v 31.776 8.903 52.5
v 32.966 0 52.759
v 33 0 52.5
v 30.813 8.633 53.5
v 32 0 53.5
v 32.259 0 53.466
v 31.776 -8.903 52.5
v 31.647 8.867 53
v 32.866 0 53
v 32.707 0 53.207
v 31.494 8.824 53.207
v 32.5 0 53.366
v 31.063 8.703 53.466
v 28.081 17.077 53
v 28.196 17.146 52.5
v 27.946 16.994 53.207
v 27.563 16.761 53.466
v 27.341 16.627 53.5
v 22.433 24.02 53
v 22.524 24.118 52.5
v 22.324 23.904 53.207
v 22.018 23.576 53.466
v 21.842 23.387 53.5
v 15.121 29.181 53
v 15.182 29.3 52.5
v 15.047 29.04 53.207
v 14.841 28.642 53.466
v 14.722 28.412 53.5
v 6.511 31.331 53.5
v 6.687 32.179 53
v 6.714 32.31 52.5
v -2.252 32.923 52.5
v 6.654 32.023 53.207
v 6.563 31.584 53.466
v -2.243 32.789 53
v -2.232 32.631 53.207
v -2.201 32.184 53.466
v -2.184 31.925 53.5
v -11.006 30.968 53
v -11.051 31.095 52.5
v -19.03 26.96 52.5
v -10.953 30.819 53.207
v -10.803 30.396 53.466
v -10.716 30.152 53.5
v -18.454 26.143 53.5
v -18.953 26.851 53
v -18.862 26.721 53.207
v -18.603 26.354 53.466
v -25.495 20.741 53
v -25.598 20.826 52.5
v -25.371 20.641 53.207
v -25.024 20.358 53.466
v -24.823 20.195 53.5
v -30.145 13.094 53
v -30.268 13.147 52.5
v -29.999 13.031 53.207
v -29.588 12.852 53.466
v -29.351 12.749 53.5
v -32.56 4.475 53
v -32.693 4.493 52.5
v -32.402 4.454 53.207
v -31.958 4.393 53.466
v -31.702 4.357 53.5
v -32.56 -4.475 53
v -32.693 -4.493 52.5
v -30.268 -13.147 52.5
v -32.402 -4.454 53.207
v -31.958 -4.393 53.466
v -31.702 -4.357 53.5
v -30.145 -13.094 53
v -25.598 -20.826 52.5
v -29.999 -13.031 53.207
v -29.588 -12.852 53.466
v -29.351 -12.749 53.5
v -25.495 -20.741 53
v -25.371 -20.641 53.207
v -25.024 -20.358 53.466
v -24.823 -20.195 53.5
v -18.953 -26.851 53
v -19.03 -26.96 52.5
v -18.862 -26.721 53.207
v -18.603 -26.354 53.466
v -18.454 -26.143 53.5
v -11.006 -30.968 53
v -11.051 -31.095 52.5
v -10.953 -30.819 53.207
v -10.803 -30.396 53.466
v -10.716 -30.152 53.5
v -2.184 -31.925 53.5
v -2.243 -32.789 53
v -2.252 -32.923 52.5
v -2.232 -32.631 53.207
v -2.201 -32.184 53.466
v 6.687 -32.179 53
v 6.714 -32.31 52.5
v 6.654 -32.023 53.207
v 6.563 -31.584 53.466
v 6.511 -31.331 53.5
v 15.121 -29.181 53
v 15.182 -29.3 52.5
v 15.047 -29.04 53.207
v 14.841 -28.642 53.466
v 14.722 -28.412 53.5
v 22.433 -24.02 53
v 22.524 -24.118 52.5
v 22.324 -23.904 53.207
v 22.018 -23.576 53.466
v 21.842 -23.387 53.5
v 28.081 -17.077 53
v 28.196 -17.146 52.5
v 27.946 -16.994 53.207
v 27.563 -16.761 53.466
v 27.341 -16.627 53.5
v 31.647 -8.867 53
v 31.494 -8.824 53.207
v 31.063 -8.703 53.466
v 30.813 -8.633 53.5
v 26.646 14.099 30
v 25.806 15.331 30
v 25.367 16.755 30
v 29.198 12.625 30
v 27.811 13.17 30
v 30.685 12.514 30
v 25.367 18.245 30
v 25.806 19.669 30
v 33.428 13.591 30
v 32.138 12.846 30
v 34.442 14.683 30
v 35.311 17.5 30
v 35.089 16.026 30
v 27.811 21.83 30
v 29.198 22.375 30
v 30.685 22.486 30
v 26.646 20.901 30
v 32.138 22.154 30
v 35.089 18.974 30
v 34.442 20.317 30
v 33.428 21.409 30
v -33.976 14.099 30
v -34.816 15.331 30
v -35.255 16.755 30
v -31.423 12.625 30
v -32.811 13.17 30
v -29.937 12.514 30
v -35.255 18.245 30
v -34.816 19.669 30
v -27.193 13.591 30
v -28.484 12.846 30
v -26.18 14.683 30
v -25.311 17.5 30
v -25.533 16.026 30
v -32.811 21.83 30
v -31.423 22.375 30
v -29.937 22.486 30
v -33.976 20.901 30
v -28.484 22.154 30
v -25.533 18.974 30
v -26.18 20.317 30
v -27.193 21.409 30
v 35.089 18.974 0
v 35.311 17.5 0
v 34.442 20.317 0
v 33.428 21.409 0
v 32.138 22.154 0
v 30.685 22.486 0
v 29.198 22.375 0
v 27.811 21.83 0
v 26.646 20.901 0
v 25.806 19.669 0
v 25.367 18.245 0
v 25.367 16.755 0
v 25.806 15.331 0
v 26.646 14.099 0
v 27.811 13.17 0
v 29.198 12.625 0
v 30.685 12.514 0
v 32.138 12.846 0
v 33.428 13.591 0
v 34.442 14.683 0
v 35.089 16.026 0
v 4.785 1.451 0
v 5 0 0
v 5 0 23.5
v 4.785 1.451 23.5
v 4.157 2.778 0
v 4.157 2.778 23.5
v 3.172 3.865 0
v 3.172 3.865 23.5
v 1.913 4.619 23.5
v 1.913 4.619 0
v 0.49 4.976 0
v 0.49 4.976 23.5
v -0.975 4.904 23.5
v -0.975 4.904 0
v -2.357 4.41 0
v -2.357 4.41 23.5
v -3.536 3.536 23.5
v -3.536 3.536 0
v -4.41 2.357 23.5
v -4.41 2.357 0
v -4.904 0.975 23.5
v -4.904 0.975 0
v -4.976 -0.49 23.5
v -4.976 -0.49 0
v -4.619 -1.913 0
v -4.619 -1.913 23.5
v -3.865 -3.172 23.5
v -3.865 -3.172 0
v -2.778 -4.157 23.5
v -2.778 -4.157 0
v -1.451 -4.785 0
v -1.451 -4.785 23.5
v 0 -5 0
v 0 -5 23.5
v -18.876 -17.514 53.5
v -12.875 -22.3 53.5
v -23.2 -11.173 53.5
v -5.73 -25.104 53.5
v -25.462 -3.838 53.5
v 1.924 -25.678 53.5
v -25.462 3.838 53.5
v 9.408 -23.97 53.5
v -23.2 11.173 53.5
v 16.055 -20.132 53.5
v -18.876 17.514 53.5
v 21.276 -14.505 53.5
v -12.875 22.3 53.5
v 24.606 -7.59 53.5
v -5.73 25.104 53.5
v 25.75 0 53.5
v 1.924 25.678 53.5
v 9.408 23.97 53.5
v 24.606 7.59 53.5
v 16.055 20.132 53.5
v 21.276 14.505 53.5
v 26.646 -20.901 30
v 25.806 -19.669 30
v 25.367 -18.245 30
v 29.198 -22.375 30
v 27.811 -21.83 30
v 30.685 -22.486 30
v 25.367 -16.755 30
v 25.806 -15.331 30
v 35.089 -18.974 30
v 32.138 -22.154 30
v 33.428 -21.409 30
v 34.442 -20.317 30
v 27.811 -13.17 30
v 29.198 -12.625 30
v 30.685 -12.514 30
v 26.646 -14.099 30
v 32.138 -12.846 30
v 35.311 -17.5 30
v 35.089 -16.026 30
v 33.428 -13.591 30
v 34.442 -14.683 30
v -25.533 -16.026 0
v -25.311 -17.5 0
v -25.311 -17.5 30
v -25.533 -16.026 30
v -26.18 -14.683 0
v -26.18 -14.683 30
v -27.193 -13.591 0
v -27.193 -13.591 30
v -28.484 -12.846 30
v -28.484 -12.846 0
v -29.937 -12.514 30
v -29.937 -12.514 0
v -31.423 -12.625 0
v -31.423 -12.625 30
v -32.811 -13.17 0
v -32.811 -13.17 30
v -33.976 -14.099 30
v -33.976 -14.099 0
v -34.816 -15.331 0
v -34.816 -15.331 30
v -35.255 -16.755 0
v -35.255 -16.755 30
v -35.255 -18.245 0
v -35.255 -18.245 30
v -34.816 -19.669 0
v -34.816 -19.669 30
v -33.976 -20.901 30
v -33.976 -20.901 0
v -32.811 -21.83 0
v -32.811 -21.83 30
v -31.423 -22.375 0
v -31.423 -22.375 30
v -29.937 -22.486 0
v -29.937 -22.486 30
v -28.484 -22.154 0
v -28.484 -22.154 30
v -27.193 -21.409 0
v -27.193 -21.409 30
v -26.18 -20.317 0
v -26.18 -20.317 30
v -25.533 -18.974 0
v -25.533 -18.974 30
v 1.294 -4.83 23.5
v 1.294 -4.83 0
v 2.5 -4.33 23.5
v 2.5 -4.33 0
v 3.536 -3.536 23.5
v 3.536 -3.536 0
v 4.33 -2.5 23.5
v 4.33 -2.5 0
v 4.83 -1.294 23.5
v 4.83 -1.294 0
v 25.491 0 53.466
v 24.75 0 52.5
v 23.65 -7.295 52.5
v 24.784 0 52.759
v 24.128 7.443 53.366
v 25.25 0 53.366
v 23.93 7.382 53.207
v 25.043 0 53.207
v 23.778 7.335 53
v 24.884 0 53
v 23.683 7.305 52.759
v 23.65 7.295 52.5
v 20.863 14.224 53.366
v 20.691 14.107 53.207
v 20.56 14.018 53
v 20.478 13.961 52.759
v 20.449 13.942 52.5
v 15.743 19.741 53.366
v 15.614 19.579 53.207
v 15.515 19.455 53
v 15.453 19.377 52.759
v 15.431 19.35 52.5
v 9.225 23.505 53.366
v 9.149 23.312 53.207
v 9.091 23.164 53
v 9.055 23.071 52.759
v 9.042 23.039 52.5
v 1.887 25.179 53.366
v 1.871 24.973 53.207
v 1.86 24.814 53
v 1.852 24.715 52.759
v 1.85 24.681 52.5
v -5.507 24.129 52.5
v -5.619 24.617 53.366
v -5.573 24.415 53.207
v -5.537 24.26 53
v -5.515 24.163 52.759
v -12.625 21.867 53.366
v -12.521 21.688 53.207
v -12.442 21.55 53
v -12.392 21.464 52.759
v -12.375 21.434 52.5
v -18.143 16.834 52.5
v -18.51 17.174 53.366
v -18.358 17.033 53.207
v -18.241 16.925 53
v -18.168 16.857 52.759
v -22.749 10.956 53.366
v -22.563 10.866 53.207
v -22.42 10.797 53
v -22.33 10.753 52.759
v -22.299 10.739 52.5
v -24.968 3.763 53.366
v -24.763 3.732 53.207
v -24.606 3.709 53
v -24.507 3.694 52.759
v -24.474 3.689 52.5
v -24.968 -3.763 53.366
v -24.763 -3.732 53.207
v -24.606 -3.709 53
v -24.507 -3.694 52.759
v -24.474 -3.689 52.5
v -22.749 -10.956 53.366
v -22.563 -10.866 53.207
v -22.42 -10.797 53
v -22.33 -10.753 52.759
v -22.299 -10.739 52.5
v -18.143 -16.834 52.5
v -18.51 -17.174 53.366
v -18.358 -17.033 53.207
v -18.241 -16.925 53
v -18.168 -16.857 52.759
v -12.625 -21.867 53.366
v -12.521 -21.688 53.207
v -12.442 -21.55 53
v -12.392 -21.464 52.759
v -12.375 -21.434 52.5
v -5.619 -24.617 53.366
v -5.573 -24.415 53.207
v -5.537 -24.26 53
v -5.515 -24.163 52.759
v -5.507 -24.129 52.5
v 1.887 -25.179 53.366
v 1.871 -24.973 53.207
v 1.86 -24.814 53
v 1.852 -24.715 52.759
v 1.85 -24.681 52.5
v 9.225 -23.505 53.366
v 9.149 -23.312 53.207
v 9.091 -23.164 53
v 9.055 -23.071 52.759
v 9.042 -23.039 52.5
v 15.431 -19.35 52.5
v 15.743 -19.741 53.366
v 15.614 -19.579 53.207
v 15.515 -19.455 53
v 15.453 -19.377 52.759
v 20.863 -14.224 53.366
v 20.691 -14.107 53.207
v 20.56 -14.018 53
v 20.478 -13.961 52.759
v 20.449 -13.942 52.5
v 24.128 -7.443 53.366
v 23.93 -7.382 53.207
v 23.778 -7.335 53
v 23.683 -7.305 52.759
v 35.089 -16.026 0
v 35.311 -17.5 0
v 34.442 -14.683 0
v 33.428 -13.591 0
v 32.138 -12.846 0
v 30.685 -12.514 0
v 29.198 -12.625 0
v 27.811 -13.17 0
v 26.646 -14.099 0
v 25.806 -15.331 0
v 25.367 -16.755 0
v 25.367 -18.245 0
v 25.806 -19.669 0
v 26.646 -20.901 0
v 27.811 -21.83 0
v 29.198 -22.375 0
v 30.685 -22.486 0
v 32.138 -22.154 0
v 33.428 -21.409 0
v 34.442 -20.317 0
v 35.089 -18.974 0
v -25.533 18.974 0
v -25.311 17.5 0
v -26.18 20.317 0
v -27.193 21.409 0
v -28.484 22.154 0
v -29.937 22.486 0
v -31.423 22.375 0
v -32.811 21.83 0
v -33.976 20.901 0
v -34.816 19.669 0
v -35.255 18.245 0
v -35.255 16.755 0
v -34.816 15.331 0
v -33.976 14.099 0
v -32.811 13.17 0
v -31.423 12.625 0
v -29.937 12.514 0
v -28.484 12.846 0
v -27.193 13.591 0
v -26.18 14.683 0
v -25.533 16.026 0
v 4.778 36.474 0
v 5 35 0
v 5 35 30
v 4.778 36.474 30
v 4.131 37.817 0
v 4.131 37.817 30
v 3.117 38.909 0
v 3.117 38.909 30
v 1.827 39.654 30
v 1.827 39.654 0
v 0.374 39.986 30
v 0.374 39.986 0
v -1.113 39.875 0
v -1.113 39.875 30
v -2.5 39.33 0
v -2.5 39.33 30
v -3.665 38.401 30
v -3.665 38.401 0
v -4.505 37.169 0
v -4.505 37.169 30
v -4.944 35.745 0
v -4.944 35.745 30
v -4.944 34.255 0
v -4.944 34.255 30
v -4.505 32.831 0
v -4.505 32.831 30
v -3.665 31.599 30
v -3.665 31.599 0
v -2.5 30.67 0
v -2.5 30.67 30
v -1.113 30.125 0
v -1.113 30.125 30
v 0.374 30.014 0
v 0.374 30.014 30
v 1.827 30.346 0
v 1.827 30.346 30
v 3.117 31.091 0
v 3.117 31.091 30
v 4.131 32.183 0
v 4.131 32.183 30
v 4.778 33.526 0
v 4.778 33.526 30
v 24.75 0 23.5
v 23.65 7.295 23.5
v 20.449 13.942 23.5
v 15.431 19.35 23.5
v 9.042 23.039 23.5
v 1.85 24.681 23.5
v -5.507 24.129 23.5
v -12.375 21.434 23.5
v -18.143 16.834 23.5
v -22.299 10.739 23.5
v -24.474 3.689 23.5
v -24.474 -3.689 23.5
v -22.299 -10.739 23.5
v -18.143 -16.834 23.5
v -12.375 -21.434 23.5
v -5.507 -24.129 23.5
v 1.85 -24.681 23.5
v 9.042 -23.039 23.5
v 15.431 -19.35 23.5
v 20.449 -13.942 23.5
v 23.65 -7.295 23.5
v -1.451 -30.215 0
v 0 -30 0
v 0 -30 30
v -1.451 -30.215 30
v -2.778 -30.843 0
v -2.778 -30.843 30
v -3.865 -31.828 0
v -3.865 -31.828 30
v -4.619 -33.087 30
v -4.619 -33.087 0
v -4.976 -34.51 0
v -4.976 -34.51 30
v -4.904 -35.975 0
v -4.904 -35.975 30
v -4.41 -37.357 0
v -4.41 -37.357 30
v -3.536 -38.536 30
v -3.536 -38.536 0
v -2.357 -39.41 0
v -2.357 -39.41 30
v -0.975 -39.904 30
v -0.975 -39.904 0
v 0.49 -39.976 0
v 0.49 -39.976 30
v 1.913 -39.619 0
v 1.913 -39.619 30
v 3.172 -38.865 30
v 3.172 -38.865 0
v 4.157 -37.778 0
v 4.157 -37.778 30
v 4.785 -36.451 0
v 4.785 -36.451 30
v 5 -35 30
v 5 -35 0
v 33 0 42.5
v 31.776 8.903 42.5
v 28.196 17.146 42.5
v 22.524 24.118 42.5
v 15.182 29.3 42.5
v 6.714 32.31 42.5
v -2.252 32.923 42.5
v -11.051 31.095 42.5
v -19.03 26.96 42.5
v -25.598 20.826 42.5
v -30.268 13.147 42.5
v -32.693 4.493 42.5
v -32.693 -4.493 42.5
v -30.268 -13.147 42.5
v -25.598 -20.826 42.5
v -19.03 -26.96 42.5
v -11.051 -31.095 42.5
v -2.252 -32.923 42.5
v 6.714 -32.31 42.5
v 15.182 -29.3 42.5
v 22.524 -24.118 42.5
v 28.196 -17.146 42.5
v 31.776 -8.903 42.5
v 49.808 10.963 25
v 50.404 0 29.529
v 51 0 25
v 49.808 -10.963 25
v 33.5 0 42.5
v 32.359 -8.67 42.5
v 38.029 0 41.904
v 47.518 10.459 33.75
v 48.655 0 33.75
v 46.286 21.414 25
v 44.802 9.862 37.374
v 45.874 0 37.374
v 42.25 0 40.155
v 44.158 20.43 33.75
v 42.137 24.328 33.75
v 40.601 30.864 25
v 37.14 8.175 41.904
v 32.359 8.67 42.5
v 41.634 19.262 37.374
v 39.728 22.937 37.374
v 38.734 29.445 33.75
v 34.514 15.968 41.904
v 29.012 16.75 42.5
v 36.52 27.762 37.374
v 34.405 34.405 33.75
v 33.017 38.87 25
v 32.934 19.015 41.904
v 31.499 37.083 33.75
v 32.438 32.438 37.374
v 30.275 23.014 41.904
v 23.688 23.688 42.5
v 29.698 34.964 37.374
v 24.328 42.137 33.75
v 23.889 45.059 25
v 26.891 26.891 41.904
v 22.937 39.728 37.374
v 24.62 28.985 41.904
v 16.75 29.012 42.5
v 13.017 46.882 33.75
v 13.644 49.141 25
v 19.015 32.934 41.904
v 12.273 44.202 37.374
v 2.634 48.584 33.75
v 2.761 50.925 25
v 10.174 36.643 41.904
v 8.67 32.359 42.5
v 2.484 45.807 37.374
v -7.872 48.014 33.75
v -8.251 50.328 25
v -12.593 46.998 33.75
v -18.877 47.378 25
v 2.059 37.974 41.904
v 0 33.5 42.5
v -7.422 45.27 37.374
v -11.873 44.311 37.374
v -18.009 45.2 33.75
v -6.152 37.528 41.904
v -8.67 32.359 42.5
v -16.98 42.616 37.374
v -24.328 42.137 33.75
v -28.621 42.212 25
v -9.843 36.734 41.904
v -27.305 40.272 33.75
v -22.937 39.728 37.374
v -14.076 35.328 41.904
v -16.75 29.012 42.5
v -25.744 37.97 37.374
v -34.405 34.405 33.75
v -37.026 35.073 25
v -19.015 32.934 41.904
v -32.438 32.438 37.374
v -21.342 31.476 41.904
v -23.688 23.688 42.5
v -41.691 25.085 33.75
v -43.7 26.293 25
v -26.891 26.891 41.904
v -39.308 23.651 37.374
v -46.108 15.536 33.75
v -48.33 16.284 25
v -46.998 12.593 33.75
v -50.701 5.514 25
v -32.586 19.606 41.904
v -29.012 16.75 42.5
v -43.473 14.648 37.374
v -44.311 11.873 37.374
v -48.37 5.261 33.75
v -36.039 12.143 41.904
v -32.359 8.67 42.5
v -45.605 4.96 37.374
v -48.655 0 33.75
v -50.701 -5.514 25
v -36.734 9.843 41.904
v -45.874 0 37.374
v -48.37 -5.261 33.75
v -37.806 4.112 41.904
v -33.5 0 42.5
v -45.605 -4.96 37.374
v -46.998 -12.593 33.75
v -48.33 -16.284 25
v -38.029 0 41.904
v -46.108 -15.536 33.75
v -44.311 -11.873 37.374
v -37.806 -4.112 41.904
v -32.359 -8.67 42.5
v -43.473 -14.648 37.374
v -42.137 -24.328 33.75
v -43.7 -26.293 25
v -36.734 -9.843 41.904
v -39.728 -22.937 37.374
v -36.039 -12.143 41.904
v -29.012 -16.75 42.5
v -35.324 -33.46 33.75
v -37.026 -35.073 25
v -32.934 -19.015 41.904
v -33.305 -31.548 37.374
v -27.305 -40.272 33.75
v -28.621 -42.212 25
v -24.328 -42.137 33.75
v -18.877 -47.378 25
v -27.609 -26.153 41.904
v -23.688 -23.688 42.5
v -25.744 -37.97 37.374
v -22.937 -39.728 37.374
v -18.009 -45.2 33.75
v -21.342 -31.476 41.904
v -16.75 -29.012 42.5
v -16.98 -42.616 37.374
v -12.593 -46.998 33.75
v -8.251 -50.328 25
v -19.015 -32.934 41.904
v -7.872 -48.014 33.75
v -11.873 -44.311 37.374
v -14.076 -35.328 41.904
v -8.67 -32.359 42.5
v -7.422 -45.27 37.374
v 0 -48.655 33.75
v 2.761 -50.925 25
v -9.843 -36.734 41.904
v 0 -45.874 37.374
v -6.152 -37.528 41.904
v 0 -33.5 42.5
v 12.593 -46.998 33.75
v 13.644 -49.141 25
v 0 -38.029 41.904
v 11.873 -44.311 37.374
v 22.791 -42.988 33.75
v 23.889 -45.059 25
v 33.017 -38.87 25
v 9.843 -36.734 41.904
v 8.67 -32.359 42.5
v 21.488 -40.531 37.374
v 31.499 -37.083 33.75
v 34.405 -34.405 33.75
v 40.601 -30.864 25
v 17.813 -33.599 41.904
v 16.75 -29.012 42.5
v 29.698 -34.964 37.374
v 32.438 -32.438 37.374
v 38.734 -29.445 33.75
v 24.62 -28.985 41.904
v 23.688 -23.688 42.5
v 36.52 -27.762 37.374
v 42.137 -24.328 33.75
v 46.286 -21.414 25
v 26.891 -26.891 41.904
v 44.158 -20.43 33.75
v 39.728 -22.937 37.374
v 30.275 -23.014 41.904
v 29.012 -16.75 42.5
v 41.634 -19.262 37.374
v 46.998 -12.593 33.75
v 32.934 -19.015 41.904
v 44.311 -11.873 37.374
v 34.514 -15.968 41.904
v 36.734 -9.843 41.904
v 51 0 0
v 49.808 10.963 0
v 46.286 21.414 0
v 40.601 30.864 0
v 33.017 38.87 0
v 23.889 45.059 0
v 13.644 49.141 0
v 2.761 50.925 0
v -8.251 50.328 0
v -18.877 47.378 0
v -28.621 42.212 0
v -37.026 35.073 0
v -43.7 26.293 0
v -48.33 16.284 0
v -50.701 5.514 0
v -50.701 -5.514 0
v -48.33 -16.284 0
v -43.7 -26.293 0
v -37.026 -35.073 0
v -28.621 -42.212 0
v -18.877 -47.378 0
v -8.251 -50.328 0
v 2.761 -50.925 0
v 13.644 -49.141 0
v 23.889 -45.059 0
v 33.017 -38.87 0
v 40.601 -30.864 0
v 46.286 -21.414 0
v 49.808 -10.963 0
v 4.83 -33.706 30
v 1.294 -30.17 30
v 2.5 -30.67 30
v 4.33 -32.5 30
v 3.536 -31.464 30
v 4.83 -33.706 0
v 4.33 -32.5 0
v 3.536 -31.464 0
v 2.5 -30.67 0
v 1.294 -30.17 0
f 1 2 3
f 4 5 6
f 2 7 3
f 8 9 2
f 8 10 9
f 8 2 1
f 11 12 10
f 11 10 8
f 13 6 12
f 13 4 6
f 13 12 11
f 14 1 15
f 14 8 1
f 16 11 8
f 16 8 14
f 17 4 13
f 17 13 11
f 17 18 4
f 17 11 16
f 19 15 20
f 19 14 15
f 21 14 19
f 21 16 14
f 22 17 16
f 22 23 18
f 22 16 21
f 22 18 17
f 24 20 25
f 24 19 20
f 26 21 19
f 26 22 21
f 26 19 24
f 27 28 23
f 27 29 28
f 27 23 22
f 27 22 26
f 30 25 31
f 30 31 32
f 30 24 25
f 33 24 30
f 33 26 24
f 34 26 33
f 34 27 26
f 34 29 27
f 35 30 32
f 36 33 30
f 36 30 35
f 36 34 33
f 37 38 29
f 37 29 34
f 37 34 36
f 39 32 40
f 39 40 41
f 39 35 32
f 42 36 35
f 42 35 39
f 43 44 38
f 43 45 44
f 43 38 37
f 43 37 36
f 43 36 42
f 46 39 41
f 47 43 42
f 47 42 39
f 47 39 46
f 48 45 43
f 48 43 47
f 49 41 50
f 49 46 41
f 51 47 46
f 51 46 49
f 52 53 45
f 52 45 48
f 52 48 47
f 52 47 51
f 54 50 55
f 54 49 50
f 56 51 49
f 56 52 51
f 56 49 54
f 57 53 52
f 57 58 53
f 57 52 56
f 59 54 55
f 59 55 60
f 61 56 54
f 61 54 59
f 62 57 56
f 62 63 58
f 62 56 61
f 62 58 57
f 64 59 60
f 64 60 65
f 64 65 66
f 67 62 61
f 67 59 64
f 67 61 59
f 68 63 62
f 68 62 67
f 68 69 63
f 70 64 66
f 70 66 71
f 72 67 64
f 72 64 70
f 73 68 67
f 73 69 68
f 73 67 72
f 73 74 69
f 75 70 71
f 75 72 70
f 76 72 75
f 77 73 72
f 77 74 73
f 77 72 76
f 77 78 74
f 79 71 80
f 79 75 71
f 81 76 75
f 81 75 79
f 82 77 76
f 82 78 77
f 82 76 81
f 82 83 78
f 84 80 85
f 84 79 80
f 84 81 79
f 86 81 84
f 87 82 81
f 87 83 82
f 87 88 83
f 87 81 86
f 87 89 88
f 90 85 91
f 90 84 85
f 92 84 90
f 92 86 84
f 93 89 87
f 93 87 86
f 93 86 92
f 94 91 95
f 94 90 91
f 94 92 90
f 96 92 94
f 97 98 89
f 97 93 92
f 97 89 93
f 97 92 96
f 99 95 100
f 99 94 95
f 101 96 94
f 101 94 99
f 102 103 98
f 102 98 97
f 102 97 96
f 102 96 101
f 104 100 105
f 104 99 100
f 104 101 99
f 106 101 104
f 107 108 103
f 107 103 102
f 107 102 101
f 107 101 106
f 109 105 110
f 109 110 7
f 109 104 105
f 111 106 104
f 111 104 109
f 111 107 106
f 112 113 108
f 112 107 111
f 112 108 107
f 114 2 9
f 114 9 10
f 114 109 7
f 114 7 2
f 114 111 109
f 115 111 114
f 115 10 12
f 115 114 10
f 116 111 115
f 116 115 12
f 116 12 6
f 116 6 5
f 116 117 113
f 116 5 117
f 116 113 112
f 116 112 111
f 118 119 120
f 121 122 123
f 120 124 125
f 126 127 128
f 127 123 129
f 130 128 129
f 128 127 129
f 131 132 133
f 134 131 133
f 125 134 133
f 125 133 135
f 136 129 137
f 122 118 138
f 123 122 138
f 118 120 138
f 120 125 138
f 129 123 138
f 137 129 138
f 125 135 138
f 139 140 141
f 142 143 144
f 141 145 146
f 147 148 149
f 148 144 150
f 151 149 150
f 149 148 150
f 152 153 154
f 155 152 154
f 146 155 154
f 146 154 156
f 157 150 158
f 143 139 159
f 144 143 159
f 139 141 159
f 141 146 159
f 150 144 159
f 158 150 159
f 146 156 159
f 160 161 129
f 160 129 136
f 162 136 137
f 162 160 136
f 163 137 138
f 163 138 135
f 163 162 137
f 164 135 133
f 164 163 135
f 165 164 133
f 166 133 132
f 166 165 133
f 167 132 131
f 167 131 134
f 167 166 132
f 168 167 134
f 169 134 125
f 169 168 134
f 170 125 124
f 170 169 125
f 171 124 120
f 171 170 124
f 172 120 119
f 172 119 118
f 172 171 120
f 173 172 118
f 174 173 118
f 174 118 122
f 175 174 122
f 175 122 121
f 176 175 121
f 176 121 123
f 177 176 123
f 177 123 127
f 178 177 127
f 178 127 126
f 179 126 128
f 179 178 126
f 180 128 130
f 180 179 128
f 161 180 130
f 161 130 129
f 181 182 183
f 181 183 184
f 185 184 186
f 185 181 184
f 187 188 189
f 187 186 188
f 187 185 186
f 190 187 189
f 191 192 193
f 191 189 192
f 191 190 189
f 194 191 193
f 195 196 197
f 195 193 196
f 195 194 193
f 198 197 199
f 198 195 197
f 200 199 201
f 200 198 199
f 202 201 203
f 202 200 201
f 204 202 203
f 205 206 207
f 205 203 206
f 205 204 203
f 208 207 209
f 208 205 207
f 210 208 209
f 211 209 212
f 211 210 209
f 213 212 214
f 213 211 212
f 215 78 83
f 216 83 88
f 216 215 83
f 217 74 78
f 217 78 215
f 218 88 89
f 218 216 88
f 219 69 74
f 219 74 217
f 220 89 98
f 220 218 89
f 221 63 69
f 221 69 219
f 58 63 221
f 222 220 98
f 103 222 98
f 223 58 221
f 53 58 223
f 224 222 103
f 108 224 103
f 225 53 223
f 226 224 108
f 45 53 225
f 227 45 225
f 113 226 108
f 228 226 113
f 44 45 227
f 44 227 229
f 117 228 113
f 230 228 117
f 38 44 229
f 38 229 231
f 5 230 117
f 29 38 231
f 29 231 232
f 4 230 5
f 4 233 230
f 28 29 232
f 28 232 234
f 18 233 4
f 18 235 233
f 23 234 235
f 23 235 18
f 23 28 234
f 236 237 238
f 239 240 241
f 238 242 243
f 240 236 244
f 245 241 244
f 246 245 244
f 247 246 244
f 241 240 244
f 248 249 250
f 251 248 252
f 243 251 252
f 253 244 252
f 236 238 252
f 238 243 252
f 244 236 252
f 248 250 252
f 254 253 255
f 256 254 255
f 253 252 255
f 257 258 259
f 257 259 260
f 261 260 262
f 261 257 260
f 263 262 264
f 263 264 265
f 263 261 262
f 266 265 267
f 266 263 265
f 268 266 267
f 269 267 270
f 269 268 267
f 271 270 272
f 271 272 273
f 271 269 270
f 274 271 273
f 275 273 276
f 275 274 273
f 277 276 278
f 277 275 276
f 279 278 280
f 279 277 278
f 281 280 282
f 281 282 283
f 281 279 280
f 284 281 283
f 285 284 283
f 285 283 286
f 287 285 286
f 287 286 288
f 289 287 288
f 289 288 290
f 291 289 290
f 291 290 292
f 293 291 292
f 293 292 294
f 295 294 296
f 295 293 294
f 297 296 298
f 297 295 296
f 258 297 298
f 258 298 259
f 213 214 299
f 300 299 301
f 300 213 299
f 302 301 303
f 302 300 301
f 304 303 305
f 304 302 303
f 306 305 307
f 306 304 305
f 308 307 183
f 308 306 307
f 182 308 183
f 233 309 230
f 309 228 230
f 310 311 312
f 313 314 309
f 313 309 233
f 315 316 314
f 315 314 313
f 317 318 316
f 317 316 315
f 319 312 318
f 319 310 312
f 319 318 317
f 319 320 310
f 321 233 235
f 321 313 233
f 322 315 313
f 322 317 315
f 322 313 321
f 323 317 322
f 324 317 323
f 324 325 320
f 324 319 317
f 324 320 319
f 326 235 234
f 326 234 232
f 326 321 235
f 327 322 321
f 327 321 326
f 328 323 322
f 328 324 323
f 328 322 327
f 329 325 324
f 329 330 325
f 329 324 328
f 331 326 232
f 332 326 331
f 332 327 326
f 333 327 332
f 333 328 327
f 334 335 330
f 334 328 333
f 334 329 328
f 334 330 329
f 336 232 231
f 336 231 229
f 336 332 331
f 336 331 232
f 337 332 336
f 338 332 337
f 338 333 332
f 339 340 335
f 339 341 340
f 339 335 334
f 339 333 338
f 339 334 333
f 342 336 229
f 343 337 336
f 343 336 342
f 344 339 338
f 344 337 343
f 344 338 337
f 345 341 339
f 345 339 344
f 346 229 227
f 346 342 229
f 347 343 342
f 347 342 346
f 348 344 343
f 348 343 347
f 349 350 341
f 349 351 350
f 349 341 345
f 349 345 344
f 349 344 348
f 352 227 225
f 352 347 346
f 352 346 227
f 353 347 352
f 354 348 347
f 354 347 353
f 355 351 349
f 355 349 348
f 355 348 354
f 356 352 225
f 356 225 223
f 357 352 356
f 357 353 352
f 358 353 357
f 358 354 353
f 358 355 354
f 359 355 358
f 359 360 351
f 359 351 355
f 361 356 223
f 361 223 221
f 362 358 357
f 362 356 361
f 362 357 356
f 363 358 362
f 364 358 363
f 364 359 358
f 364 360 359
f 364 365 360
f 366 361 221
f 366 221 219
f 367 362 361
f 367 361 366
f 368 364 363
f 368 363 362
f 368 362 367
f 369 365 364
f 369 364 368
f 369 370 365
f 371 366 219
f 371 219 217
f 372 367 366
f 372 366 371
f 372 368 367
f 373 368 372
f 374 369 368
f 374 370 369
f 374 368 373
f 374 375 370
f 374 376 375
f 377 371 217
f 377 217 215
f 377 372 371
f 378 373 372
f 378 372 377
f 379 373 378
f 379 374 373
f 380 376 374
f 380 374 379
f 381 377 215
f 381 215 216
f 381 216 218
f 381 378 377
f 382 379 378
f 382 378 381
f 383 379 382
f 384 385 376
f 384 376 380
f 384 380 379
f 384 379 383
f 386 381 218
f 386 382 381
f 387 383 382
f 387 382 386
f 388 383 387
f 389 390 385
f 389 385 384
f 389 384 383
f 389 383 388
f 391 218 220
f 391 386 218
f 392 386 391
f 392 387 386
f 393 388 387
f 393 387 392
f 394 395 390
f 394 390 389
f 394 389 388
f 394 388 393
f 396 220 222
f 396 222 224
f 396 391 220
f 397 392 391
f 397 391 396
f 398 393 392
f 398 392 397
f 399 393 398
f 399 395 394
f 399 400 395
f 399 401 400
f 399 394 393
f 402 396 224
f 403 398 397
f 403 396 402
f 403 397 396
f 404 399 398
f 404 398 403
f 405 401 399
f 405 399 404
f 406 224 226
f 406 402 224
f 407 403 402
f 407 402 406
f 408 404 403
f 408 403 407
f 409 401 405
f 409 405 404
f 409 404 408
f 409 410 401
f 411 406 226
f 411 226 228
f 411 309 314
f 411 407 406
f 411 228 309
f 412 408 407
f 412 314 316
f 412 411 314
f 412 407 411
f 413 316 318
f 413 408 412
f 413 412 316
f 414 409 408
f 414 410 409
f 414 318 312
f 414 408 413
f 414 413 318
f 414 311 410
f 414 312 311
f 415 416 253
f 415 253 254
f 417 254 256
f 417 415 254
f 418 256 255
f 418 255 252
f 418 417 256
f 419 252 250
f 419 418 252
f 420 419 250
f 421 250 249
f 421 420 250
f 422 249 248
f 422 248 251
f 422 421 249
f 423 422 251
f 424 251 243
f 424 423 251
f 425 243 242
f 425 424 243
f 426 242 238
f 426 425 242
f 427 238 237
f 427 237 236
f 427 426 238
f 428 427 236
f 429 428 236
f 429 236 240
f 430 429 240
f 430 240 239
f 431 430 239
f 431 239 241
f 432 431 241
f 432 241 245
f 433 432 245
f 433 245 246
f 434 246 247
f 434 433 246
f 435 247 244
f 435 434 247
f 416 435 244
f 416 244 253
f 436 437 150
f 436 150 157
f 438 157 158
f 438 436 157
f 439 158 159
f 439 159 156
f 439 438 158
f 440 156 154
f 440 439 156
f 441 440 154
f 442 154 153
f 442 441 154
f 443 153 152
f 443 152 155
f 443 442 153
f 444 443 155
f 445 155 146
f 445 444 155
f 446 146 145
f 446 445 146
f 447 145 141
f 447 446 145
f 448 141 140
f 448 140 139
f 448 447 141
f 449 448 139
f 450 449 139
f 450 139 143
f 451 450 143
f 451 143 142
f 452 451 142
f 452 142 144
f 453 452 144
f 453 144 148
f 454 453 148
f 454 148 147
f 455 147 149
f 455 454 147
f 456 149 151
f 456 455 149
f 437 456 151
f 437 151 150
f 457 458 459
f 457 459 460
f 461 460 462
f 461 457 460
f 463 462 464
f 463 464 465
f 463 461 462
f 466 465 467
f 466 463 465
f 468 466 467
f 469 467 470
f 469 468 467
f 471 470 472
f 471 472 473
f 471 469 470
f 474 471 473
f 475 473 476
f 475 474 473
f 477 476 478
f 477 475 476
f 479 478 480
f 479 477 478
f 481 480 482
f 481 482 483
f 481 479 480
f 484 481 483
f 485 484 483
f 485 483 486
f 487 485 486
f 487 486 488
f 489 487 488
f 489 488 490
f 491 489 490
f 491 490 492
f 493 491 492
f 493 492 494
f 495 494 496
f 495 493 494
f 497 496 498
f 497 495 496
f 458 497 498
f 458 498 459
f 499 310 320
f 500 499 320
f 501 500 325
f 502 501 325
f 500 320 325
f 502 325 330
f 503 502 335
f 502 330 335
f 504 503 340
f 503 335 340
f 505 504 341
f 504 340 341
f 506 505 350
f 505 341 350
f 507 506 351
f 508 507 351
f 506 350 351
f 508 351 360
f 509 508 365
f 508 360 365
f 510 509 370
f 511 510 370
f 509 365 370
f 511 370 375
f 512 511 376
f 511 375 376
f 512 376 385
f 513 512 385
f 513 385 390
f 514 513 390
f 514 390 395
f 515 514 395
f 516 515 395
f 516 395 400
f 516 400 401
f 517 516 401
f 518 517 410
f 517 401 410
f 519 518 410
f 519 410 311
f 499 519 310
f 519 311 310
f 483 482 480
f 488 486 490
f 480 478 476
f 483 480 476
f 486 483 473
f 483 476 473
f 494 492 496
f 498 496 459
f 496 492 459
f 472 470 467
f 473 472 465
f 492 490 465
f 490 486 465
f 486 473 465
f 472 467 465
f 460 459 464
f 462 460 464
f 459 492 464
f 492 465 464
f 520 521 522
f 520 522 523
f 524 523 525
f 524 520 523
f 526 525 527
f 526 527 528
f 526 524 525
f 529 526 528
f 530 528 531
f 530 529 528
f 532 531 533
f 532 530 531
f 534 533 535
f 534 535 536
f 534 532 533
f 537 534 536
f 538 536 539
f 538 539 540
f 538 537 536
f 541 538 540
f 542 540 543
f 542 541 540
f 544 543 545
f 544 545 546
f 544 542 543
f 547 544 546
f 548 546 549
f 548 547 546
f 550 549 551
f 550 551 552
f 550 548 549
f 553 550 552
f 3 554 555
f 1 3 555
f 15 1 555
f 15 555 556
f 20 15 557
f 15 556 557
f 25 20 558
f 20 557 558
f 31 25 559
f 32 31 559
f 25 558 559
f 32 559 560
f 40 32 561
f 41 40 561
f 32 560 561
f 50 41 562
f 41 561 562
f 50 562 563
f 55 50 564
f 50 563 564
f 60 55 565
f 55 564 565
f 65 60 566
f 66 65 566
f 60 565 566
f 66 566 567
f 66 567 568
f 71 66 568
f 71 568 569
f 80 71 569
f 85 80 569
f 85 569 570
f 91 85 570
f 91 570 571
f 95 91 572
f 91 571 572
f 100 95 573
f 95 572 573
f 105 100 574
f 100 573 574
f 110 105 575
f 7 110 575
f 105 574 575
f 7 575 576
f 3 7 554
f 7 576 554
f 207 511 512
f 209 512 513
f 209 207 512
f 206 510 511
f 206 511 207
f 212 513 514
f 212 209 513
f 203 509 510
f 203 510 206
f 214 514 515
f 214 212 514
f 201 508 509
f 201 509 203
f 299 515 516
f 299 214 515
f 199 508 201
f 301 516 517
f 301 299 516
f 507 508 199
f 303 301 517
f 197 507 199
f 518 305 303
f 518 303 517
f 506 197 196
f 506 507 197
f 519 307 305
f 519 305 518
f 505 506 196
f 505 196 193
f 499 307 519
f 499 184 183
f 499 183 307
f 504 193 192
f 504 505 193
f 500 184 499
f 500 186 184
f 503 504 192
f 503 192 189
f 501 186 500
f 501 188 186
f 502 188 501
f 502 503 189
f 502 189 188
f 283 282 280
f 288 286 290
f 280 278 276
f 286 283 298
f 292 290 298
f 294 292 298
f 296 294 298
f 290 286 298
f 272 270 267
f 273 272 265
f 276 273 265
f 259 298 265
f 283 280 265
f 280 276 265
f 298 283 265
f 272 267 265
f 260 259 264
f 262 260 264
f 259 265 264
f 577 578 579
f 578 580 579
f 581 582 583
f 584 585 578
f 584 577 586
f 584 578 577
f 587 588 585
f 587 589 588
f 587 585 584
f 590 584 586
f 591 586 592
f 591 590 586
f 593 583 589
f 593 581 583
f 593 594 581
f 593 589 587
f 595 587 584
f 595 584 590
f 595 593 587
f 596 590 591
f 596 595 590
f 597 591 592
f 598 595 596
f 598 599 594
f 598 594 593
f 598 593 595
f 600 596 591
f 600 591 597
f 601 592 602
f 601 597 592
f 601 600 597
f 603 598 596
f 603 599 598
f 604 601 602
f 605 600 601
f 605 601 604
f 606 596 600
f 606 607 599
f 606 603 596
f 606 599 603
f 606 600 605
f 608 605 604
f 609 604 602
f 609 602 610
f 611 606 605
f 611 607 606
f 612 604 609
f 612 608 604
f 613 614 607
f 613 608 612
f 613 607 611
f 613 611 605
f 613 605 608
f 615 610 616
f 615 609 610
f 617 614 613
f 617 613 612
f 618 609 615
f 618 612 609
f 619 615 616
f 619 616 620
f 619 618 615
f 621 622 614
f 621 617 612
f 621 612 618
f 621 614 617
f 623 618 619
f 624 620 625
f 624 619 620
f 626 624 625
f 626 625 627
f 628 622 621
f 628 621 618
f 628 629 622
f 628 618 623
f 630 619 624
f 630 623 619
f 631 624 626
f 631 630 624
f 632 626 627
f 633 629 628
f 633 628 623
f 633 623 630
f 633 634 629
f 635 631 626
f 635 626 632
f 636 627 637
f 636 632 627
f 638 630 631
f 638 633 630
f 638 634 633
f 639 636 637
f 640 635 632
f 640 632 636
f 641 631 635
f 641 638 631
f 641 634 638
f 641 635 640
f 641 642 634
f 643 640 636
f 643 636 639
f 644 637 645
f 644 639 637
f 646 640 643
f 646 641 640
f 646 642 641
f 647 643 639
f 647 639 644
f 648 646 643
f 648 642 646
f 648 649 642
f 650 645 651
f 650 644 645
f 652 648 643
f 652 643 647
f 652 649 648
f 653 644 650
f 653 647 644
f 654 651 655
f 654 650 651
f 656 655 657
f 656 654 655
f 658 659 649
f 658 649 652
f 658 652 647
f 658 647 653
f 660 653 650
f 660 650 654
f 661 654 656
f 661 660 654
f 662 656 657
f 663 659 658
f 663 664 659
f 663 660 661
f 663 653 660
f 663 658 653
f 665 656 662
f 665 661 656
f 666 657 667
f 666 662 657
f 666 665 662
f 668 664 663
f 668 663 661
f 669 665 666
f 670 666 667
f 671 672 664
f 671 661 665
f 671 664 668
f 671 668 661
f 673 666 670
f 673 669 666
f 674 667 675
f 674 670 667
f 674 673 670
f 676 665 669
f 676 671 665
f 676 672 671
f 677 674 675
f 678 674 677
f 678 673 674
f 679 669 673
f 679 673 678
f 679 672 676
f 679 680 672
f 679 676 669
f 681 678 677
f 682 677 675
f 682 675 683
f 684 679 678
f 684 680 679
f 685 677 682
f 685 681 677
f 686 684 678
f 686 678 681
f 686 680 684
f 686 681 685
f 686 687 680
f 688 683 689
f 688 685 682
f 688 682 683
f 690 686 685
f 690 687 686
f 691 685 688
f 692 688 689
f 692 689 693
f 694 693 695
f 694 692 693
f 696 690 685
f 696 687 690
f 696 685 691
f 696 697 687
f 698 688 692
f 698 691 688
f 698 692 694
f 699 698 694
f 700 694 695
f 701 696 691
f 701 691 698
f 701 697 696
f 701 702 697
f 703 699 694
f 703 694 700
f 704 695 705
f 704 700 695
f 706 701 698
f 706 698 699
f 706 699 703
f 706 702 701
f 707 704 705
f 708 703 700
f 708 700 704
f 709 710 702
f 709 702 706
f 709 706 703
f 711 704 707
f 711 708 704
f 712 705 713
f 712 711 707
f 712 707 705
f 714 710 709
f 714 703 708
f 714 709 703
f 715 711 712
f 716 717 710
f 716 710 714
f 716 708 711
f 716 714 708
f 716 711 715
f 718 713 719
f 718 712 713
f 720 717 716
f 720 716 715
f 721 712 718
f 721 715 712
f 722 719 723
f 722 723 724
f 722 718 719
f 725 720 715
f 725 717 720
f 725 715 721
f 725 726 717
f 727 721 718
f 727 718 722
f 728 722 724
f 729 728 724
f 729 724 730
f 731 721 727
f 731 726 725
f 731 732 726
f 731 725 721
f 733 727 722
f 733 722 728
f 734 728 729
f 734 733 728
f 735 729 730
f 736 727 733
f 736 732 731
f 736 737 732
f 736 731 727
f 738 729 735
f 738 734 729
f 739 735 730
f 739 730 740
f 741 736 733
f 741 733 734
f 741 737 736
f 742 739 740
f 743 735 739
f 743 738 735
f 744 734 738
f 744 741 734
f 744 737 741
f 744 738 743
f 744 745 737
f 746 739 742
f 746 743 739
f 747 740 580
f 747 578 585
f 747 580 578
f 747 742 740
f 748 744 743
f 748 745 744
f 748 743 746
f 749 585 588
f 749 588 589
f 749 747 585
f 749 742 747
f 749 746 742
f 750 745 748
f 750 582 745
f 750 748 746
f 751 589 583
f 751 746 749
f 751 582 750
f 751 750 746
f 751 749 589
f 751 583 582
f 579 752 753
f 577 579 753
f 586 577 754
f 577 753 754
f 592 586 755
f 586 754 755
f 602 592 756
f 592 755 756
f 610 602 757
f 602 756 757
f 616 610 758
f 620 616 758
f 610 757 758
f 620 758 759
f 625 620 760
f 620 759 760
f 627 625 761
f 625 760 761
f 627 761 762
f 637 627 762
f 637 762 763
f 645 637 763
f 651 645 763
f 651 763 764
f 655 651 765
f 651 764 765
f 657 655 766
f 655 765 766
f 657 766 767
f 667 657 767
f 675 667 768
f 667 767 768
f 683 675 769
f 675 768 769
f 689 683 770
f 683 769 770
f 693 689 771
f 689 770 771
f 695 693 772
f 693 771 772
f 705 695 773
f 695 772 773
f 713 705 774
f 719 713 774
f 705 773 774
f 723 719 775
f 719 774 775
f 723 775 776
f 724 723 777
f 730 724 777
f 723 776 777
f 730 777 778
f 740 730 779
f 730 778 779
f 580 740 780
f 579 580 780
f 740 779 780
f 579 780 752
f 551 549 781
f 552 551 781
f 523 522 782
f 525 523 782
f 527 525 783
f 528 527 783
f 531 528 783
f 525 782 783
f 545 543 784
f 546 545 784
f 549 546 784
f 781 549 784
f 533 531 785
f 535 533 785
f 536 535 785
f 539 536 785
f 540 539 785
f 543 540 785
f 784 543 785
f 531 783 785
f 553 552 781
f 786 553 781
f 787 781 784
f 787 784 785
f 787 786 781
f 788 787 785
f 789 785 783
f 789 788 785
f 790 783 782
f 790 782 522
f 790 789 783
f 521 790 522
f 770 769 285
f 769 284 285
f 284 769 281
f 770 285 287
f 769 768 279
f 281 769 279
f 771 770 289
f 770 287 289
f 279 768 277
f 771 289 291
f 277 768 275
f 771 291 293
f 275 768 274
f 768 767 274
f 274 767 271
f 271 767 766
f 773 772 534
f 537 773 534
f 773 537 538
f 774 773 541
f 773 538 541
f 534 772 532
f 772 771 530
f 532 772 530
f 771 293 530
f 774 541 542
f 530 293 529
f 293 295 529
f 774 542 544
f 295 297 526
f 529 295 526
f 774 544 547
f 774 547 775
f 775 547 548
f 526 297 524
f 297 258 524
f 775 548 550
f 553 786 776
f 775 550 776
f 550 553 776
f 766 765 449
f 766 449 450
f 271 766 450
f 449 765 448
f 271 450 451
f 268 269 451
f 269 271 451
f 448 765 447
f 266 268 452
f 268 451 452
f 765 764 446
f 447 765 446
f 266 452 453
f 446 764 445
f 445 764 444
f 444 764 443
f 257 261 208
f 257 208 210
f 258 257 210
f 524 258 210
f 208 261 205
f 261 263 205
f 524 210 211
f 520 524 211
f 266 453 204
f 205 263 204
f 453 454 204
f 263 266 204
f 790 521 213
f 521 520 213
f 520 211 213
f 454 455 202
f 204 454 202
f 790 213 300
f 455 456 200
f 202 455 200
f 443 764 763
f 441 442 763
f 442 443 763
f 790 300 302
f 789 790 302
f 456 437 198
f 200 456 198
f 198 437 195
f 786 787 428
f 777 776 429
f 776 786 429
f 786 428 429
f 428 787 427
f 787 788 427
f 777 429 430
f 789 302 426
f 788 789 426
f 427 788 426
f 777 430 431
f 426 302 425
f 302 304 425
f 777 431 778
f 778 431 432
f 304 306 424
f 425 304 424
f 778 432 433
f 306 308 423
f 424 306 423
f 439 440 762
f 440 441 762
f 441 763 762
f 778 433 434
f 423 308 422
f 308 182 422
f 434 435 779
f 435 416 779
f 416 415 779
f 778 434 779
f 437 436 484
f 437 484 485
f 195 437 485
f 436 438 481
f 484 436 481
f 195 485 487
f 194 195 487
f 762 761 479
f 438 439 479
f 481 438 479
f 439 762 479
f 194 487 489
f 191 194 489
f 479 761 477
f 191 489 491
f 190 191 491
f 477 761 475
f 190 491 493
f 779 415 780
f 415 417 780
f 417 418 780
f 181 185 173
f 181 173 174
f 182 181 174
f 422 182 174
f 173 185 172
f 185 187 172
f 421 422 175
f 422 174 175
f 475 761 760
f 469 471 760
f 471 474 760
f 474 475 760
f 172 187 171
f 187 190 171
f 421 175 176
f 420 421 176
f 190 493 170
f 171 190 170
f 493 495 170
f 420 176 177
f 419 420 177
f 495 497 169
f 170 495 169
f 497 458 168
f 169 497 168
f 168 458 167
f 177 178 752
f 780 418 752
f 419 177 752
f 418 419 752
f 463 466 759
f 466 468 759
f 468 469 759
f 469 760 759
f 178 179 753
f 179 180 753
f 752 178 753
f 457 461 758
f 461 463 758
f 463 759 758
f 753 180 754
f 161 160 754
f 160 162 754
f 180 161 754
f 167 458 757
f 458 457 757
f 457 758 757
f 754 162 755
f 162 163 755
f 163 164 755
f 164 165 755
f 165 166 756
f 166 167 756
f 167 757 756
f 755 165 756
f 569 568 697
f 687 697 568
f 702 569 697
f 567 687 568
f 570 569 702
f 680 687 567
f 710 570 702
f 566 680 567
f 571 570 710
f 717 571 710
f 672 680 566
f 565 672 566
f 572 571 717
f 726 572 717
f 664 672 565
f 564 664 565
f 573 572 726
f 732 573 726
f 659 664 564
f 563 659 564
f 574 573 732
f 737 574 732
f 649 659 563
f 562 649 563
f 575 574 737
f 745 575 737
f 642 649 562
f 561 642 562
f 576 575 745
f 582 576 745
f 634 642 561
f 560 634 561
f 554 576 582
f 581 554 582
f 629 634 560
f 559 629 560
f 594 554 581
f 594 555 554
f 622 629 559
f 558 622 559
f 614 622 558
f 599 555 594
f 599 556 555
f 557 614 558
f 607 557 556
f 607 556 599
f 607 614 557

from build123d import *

# Parameters (mm, degrees)
F0_R     = 51
F1_DEPTH = 42.5
F2_R     = 17.5
F3_R     = 5
F4_DEPTH = 30
F5_R     = 33
F6_DEPTH = 11
F7_R     = 1
F8_R     = 24.75
F9_DEPTH = 30
F10_R    = 1


with BuildPart() as f1:
    # F0 (on Top) → F1 (new body)
    with BuildSketch(Plane.XY):
        Circle(F0_R)
    extrude(amount=F1_DEPTH)

    # F2
    f2_edges = [f1.edges().sort_by_distance(p)[0] for p in [
        (-51, 0, 42.5),
    ]]
    fillet(f2_edges, radius=F2_R)

    # F3 (on Top) → F4 (cut)
    with BuildSketch(Plane.XY):
        with Locations((-30.3108891325, -17.5)):
            Circle(F3_R)
        with BuildLine():
            ThreePointArc((5, -35), (3.5355339059, -31.4644660941), (0, -30))
            ThreePointArc((0, -30), (-3.5355339059, -38.5355339059), (5, -35))
        make_face()
        with Locations((30.3108891325, -17.5)):
            Circle(F3_R)
        with Locations((30.3108891325, 17.5)):
            Circle(F3_R)
        with BuildLine():
            ThreePointArc((0, -5), (3.5355339059, -3.5355339059), (5, 0))
            ThreePointArc((5, 0), (-3.5355339059, 3.5355339059), (0, -5))
        make_face()
        with Locations((0, 35)):
            Circle(F3_R)
        with Locations((-30.3108891325, 17.5)):
            Circle(F3_R)
    extrude(amount=F4_DEPTH, mode=Mode.SUBTRACT)

    # F5 (on face) → F6 (join)
    with BuildSketch(Plane.XY.offset(42.5)):
        Circle(F5_R)
    extrude(amount=F6_DEPTH)

    # F7
    f7_edges = [f1.edges().sort_by_distance(p)[0] for p in [
        (-33, 0, 53.5),
    ]]
    fillet(f7_edges, radius=F7_R)

    # F8 (on face) → F9 (cut)
    with BuildSketch(Plane.XY.offset(53.5)):
        Circle(F8_R)
    extrude(amount=-F9_DEPTH, mode=Mode.SUBTRACT)

    # F10
    f10_edges = [f1.edges().sort_by_distance(p)[0] for p in [
        (-32, 0, 53.5),
        (-24.75, 0, 53.5),
    ]]
    fillet(f10_edges, radius=F10_R)


solid = f1.part
